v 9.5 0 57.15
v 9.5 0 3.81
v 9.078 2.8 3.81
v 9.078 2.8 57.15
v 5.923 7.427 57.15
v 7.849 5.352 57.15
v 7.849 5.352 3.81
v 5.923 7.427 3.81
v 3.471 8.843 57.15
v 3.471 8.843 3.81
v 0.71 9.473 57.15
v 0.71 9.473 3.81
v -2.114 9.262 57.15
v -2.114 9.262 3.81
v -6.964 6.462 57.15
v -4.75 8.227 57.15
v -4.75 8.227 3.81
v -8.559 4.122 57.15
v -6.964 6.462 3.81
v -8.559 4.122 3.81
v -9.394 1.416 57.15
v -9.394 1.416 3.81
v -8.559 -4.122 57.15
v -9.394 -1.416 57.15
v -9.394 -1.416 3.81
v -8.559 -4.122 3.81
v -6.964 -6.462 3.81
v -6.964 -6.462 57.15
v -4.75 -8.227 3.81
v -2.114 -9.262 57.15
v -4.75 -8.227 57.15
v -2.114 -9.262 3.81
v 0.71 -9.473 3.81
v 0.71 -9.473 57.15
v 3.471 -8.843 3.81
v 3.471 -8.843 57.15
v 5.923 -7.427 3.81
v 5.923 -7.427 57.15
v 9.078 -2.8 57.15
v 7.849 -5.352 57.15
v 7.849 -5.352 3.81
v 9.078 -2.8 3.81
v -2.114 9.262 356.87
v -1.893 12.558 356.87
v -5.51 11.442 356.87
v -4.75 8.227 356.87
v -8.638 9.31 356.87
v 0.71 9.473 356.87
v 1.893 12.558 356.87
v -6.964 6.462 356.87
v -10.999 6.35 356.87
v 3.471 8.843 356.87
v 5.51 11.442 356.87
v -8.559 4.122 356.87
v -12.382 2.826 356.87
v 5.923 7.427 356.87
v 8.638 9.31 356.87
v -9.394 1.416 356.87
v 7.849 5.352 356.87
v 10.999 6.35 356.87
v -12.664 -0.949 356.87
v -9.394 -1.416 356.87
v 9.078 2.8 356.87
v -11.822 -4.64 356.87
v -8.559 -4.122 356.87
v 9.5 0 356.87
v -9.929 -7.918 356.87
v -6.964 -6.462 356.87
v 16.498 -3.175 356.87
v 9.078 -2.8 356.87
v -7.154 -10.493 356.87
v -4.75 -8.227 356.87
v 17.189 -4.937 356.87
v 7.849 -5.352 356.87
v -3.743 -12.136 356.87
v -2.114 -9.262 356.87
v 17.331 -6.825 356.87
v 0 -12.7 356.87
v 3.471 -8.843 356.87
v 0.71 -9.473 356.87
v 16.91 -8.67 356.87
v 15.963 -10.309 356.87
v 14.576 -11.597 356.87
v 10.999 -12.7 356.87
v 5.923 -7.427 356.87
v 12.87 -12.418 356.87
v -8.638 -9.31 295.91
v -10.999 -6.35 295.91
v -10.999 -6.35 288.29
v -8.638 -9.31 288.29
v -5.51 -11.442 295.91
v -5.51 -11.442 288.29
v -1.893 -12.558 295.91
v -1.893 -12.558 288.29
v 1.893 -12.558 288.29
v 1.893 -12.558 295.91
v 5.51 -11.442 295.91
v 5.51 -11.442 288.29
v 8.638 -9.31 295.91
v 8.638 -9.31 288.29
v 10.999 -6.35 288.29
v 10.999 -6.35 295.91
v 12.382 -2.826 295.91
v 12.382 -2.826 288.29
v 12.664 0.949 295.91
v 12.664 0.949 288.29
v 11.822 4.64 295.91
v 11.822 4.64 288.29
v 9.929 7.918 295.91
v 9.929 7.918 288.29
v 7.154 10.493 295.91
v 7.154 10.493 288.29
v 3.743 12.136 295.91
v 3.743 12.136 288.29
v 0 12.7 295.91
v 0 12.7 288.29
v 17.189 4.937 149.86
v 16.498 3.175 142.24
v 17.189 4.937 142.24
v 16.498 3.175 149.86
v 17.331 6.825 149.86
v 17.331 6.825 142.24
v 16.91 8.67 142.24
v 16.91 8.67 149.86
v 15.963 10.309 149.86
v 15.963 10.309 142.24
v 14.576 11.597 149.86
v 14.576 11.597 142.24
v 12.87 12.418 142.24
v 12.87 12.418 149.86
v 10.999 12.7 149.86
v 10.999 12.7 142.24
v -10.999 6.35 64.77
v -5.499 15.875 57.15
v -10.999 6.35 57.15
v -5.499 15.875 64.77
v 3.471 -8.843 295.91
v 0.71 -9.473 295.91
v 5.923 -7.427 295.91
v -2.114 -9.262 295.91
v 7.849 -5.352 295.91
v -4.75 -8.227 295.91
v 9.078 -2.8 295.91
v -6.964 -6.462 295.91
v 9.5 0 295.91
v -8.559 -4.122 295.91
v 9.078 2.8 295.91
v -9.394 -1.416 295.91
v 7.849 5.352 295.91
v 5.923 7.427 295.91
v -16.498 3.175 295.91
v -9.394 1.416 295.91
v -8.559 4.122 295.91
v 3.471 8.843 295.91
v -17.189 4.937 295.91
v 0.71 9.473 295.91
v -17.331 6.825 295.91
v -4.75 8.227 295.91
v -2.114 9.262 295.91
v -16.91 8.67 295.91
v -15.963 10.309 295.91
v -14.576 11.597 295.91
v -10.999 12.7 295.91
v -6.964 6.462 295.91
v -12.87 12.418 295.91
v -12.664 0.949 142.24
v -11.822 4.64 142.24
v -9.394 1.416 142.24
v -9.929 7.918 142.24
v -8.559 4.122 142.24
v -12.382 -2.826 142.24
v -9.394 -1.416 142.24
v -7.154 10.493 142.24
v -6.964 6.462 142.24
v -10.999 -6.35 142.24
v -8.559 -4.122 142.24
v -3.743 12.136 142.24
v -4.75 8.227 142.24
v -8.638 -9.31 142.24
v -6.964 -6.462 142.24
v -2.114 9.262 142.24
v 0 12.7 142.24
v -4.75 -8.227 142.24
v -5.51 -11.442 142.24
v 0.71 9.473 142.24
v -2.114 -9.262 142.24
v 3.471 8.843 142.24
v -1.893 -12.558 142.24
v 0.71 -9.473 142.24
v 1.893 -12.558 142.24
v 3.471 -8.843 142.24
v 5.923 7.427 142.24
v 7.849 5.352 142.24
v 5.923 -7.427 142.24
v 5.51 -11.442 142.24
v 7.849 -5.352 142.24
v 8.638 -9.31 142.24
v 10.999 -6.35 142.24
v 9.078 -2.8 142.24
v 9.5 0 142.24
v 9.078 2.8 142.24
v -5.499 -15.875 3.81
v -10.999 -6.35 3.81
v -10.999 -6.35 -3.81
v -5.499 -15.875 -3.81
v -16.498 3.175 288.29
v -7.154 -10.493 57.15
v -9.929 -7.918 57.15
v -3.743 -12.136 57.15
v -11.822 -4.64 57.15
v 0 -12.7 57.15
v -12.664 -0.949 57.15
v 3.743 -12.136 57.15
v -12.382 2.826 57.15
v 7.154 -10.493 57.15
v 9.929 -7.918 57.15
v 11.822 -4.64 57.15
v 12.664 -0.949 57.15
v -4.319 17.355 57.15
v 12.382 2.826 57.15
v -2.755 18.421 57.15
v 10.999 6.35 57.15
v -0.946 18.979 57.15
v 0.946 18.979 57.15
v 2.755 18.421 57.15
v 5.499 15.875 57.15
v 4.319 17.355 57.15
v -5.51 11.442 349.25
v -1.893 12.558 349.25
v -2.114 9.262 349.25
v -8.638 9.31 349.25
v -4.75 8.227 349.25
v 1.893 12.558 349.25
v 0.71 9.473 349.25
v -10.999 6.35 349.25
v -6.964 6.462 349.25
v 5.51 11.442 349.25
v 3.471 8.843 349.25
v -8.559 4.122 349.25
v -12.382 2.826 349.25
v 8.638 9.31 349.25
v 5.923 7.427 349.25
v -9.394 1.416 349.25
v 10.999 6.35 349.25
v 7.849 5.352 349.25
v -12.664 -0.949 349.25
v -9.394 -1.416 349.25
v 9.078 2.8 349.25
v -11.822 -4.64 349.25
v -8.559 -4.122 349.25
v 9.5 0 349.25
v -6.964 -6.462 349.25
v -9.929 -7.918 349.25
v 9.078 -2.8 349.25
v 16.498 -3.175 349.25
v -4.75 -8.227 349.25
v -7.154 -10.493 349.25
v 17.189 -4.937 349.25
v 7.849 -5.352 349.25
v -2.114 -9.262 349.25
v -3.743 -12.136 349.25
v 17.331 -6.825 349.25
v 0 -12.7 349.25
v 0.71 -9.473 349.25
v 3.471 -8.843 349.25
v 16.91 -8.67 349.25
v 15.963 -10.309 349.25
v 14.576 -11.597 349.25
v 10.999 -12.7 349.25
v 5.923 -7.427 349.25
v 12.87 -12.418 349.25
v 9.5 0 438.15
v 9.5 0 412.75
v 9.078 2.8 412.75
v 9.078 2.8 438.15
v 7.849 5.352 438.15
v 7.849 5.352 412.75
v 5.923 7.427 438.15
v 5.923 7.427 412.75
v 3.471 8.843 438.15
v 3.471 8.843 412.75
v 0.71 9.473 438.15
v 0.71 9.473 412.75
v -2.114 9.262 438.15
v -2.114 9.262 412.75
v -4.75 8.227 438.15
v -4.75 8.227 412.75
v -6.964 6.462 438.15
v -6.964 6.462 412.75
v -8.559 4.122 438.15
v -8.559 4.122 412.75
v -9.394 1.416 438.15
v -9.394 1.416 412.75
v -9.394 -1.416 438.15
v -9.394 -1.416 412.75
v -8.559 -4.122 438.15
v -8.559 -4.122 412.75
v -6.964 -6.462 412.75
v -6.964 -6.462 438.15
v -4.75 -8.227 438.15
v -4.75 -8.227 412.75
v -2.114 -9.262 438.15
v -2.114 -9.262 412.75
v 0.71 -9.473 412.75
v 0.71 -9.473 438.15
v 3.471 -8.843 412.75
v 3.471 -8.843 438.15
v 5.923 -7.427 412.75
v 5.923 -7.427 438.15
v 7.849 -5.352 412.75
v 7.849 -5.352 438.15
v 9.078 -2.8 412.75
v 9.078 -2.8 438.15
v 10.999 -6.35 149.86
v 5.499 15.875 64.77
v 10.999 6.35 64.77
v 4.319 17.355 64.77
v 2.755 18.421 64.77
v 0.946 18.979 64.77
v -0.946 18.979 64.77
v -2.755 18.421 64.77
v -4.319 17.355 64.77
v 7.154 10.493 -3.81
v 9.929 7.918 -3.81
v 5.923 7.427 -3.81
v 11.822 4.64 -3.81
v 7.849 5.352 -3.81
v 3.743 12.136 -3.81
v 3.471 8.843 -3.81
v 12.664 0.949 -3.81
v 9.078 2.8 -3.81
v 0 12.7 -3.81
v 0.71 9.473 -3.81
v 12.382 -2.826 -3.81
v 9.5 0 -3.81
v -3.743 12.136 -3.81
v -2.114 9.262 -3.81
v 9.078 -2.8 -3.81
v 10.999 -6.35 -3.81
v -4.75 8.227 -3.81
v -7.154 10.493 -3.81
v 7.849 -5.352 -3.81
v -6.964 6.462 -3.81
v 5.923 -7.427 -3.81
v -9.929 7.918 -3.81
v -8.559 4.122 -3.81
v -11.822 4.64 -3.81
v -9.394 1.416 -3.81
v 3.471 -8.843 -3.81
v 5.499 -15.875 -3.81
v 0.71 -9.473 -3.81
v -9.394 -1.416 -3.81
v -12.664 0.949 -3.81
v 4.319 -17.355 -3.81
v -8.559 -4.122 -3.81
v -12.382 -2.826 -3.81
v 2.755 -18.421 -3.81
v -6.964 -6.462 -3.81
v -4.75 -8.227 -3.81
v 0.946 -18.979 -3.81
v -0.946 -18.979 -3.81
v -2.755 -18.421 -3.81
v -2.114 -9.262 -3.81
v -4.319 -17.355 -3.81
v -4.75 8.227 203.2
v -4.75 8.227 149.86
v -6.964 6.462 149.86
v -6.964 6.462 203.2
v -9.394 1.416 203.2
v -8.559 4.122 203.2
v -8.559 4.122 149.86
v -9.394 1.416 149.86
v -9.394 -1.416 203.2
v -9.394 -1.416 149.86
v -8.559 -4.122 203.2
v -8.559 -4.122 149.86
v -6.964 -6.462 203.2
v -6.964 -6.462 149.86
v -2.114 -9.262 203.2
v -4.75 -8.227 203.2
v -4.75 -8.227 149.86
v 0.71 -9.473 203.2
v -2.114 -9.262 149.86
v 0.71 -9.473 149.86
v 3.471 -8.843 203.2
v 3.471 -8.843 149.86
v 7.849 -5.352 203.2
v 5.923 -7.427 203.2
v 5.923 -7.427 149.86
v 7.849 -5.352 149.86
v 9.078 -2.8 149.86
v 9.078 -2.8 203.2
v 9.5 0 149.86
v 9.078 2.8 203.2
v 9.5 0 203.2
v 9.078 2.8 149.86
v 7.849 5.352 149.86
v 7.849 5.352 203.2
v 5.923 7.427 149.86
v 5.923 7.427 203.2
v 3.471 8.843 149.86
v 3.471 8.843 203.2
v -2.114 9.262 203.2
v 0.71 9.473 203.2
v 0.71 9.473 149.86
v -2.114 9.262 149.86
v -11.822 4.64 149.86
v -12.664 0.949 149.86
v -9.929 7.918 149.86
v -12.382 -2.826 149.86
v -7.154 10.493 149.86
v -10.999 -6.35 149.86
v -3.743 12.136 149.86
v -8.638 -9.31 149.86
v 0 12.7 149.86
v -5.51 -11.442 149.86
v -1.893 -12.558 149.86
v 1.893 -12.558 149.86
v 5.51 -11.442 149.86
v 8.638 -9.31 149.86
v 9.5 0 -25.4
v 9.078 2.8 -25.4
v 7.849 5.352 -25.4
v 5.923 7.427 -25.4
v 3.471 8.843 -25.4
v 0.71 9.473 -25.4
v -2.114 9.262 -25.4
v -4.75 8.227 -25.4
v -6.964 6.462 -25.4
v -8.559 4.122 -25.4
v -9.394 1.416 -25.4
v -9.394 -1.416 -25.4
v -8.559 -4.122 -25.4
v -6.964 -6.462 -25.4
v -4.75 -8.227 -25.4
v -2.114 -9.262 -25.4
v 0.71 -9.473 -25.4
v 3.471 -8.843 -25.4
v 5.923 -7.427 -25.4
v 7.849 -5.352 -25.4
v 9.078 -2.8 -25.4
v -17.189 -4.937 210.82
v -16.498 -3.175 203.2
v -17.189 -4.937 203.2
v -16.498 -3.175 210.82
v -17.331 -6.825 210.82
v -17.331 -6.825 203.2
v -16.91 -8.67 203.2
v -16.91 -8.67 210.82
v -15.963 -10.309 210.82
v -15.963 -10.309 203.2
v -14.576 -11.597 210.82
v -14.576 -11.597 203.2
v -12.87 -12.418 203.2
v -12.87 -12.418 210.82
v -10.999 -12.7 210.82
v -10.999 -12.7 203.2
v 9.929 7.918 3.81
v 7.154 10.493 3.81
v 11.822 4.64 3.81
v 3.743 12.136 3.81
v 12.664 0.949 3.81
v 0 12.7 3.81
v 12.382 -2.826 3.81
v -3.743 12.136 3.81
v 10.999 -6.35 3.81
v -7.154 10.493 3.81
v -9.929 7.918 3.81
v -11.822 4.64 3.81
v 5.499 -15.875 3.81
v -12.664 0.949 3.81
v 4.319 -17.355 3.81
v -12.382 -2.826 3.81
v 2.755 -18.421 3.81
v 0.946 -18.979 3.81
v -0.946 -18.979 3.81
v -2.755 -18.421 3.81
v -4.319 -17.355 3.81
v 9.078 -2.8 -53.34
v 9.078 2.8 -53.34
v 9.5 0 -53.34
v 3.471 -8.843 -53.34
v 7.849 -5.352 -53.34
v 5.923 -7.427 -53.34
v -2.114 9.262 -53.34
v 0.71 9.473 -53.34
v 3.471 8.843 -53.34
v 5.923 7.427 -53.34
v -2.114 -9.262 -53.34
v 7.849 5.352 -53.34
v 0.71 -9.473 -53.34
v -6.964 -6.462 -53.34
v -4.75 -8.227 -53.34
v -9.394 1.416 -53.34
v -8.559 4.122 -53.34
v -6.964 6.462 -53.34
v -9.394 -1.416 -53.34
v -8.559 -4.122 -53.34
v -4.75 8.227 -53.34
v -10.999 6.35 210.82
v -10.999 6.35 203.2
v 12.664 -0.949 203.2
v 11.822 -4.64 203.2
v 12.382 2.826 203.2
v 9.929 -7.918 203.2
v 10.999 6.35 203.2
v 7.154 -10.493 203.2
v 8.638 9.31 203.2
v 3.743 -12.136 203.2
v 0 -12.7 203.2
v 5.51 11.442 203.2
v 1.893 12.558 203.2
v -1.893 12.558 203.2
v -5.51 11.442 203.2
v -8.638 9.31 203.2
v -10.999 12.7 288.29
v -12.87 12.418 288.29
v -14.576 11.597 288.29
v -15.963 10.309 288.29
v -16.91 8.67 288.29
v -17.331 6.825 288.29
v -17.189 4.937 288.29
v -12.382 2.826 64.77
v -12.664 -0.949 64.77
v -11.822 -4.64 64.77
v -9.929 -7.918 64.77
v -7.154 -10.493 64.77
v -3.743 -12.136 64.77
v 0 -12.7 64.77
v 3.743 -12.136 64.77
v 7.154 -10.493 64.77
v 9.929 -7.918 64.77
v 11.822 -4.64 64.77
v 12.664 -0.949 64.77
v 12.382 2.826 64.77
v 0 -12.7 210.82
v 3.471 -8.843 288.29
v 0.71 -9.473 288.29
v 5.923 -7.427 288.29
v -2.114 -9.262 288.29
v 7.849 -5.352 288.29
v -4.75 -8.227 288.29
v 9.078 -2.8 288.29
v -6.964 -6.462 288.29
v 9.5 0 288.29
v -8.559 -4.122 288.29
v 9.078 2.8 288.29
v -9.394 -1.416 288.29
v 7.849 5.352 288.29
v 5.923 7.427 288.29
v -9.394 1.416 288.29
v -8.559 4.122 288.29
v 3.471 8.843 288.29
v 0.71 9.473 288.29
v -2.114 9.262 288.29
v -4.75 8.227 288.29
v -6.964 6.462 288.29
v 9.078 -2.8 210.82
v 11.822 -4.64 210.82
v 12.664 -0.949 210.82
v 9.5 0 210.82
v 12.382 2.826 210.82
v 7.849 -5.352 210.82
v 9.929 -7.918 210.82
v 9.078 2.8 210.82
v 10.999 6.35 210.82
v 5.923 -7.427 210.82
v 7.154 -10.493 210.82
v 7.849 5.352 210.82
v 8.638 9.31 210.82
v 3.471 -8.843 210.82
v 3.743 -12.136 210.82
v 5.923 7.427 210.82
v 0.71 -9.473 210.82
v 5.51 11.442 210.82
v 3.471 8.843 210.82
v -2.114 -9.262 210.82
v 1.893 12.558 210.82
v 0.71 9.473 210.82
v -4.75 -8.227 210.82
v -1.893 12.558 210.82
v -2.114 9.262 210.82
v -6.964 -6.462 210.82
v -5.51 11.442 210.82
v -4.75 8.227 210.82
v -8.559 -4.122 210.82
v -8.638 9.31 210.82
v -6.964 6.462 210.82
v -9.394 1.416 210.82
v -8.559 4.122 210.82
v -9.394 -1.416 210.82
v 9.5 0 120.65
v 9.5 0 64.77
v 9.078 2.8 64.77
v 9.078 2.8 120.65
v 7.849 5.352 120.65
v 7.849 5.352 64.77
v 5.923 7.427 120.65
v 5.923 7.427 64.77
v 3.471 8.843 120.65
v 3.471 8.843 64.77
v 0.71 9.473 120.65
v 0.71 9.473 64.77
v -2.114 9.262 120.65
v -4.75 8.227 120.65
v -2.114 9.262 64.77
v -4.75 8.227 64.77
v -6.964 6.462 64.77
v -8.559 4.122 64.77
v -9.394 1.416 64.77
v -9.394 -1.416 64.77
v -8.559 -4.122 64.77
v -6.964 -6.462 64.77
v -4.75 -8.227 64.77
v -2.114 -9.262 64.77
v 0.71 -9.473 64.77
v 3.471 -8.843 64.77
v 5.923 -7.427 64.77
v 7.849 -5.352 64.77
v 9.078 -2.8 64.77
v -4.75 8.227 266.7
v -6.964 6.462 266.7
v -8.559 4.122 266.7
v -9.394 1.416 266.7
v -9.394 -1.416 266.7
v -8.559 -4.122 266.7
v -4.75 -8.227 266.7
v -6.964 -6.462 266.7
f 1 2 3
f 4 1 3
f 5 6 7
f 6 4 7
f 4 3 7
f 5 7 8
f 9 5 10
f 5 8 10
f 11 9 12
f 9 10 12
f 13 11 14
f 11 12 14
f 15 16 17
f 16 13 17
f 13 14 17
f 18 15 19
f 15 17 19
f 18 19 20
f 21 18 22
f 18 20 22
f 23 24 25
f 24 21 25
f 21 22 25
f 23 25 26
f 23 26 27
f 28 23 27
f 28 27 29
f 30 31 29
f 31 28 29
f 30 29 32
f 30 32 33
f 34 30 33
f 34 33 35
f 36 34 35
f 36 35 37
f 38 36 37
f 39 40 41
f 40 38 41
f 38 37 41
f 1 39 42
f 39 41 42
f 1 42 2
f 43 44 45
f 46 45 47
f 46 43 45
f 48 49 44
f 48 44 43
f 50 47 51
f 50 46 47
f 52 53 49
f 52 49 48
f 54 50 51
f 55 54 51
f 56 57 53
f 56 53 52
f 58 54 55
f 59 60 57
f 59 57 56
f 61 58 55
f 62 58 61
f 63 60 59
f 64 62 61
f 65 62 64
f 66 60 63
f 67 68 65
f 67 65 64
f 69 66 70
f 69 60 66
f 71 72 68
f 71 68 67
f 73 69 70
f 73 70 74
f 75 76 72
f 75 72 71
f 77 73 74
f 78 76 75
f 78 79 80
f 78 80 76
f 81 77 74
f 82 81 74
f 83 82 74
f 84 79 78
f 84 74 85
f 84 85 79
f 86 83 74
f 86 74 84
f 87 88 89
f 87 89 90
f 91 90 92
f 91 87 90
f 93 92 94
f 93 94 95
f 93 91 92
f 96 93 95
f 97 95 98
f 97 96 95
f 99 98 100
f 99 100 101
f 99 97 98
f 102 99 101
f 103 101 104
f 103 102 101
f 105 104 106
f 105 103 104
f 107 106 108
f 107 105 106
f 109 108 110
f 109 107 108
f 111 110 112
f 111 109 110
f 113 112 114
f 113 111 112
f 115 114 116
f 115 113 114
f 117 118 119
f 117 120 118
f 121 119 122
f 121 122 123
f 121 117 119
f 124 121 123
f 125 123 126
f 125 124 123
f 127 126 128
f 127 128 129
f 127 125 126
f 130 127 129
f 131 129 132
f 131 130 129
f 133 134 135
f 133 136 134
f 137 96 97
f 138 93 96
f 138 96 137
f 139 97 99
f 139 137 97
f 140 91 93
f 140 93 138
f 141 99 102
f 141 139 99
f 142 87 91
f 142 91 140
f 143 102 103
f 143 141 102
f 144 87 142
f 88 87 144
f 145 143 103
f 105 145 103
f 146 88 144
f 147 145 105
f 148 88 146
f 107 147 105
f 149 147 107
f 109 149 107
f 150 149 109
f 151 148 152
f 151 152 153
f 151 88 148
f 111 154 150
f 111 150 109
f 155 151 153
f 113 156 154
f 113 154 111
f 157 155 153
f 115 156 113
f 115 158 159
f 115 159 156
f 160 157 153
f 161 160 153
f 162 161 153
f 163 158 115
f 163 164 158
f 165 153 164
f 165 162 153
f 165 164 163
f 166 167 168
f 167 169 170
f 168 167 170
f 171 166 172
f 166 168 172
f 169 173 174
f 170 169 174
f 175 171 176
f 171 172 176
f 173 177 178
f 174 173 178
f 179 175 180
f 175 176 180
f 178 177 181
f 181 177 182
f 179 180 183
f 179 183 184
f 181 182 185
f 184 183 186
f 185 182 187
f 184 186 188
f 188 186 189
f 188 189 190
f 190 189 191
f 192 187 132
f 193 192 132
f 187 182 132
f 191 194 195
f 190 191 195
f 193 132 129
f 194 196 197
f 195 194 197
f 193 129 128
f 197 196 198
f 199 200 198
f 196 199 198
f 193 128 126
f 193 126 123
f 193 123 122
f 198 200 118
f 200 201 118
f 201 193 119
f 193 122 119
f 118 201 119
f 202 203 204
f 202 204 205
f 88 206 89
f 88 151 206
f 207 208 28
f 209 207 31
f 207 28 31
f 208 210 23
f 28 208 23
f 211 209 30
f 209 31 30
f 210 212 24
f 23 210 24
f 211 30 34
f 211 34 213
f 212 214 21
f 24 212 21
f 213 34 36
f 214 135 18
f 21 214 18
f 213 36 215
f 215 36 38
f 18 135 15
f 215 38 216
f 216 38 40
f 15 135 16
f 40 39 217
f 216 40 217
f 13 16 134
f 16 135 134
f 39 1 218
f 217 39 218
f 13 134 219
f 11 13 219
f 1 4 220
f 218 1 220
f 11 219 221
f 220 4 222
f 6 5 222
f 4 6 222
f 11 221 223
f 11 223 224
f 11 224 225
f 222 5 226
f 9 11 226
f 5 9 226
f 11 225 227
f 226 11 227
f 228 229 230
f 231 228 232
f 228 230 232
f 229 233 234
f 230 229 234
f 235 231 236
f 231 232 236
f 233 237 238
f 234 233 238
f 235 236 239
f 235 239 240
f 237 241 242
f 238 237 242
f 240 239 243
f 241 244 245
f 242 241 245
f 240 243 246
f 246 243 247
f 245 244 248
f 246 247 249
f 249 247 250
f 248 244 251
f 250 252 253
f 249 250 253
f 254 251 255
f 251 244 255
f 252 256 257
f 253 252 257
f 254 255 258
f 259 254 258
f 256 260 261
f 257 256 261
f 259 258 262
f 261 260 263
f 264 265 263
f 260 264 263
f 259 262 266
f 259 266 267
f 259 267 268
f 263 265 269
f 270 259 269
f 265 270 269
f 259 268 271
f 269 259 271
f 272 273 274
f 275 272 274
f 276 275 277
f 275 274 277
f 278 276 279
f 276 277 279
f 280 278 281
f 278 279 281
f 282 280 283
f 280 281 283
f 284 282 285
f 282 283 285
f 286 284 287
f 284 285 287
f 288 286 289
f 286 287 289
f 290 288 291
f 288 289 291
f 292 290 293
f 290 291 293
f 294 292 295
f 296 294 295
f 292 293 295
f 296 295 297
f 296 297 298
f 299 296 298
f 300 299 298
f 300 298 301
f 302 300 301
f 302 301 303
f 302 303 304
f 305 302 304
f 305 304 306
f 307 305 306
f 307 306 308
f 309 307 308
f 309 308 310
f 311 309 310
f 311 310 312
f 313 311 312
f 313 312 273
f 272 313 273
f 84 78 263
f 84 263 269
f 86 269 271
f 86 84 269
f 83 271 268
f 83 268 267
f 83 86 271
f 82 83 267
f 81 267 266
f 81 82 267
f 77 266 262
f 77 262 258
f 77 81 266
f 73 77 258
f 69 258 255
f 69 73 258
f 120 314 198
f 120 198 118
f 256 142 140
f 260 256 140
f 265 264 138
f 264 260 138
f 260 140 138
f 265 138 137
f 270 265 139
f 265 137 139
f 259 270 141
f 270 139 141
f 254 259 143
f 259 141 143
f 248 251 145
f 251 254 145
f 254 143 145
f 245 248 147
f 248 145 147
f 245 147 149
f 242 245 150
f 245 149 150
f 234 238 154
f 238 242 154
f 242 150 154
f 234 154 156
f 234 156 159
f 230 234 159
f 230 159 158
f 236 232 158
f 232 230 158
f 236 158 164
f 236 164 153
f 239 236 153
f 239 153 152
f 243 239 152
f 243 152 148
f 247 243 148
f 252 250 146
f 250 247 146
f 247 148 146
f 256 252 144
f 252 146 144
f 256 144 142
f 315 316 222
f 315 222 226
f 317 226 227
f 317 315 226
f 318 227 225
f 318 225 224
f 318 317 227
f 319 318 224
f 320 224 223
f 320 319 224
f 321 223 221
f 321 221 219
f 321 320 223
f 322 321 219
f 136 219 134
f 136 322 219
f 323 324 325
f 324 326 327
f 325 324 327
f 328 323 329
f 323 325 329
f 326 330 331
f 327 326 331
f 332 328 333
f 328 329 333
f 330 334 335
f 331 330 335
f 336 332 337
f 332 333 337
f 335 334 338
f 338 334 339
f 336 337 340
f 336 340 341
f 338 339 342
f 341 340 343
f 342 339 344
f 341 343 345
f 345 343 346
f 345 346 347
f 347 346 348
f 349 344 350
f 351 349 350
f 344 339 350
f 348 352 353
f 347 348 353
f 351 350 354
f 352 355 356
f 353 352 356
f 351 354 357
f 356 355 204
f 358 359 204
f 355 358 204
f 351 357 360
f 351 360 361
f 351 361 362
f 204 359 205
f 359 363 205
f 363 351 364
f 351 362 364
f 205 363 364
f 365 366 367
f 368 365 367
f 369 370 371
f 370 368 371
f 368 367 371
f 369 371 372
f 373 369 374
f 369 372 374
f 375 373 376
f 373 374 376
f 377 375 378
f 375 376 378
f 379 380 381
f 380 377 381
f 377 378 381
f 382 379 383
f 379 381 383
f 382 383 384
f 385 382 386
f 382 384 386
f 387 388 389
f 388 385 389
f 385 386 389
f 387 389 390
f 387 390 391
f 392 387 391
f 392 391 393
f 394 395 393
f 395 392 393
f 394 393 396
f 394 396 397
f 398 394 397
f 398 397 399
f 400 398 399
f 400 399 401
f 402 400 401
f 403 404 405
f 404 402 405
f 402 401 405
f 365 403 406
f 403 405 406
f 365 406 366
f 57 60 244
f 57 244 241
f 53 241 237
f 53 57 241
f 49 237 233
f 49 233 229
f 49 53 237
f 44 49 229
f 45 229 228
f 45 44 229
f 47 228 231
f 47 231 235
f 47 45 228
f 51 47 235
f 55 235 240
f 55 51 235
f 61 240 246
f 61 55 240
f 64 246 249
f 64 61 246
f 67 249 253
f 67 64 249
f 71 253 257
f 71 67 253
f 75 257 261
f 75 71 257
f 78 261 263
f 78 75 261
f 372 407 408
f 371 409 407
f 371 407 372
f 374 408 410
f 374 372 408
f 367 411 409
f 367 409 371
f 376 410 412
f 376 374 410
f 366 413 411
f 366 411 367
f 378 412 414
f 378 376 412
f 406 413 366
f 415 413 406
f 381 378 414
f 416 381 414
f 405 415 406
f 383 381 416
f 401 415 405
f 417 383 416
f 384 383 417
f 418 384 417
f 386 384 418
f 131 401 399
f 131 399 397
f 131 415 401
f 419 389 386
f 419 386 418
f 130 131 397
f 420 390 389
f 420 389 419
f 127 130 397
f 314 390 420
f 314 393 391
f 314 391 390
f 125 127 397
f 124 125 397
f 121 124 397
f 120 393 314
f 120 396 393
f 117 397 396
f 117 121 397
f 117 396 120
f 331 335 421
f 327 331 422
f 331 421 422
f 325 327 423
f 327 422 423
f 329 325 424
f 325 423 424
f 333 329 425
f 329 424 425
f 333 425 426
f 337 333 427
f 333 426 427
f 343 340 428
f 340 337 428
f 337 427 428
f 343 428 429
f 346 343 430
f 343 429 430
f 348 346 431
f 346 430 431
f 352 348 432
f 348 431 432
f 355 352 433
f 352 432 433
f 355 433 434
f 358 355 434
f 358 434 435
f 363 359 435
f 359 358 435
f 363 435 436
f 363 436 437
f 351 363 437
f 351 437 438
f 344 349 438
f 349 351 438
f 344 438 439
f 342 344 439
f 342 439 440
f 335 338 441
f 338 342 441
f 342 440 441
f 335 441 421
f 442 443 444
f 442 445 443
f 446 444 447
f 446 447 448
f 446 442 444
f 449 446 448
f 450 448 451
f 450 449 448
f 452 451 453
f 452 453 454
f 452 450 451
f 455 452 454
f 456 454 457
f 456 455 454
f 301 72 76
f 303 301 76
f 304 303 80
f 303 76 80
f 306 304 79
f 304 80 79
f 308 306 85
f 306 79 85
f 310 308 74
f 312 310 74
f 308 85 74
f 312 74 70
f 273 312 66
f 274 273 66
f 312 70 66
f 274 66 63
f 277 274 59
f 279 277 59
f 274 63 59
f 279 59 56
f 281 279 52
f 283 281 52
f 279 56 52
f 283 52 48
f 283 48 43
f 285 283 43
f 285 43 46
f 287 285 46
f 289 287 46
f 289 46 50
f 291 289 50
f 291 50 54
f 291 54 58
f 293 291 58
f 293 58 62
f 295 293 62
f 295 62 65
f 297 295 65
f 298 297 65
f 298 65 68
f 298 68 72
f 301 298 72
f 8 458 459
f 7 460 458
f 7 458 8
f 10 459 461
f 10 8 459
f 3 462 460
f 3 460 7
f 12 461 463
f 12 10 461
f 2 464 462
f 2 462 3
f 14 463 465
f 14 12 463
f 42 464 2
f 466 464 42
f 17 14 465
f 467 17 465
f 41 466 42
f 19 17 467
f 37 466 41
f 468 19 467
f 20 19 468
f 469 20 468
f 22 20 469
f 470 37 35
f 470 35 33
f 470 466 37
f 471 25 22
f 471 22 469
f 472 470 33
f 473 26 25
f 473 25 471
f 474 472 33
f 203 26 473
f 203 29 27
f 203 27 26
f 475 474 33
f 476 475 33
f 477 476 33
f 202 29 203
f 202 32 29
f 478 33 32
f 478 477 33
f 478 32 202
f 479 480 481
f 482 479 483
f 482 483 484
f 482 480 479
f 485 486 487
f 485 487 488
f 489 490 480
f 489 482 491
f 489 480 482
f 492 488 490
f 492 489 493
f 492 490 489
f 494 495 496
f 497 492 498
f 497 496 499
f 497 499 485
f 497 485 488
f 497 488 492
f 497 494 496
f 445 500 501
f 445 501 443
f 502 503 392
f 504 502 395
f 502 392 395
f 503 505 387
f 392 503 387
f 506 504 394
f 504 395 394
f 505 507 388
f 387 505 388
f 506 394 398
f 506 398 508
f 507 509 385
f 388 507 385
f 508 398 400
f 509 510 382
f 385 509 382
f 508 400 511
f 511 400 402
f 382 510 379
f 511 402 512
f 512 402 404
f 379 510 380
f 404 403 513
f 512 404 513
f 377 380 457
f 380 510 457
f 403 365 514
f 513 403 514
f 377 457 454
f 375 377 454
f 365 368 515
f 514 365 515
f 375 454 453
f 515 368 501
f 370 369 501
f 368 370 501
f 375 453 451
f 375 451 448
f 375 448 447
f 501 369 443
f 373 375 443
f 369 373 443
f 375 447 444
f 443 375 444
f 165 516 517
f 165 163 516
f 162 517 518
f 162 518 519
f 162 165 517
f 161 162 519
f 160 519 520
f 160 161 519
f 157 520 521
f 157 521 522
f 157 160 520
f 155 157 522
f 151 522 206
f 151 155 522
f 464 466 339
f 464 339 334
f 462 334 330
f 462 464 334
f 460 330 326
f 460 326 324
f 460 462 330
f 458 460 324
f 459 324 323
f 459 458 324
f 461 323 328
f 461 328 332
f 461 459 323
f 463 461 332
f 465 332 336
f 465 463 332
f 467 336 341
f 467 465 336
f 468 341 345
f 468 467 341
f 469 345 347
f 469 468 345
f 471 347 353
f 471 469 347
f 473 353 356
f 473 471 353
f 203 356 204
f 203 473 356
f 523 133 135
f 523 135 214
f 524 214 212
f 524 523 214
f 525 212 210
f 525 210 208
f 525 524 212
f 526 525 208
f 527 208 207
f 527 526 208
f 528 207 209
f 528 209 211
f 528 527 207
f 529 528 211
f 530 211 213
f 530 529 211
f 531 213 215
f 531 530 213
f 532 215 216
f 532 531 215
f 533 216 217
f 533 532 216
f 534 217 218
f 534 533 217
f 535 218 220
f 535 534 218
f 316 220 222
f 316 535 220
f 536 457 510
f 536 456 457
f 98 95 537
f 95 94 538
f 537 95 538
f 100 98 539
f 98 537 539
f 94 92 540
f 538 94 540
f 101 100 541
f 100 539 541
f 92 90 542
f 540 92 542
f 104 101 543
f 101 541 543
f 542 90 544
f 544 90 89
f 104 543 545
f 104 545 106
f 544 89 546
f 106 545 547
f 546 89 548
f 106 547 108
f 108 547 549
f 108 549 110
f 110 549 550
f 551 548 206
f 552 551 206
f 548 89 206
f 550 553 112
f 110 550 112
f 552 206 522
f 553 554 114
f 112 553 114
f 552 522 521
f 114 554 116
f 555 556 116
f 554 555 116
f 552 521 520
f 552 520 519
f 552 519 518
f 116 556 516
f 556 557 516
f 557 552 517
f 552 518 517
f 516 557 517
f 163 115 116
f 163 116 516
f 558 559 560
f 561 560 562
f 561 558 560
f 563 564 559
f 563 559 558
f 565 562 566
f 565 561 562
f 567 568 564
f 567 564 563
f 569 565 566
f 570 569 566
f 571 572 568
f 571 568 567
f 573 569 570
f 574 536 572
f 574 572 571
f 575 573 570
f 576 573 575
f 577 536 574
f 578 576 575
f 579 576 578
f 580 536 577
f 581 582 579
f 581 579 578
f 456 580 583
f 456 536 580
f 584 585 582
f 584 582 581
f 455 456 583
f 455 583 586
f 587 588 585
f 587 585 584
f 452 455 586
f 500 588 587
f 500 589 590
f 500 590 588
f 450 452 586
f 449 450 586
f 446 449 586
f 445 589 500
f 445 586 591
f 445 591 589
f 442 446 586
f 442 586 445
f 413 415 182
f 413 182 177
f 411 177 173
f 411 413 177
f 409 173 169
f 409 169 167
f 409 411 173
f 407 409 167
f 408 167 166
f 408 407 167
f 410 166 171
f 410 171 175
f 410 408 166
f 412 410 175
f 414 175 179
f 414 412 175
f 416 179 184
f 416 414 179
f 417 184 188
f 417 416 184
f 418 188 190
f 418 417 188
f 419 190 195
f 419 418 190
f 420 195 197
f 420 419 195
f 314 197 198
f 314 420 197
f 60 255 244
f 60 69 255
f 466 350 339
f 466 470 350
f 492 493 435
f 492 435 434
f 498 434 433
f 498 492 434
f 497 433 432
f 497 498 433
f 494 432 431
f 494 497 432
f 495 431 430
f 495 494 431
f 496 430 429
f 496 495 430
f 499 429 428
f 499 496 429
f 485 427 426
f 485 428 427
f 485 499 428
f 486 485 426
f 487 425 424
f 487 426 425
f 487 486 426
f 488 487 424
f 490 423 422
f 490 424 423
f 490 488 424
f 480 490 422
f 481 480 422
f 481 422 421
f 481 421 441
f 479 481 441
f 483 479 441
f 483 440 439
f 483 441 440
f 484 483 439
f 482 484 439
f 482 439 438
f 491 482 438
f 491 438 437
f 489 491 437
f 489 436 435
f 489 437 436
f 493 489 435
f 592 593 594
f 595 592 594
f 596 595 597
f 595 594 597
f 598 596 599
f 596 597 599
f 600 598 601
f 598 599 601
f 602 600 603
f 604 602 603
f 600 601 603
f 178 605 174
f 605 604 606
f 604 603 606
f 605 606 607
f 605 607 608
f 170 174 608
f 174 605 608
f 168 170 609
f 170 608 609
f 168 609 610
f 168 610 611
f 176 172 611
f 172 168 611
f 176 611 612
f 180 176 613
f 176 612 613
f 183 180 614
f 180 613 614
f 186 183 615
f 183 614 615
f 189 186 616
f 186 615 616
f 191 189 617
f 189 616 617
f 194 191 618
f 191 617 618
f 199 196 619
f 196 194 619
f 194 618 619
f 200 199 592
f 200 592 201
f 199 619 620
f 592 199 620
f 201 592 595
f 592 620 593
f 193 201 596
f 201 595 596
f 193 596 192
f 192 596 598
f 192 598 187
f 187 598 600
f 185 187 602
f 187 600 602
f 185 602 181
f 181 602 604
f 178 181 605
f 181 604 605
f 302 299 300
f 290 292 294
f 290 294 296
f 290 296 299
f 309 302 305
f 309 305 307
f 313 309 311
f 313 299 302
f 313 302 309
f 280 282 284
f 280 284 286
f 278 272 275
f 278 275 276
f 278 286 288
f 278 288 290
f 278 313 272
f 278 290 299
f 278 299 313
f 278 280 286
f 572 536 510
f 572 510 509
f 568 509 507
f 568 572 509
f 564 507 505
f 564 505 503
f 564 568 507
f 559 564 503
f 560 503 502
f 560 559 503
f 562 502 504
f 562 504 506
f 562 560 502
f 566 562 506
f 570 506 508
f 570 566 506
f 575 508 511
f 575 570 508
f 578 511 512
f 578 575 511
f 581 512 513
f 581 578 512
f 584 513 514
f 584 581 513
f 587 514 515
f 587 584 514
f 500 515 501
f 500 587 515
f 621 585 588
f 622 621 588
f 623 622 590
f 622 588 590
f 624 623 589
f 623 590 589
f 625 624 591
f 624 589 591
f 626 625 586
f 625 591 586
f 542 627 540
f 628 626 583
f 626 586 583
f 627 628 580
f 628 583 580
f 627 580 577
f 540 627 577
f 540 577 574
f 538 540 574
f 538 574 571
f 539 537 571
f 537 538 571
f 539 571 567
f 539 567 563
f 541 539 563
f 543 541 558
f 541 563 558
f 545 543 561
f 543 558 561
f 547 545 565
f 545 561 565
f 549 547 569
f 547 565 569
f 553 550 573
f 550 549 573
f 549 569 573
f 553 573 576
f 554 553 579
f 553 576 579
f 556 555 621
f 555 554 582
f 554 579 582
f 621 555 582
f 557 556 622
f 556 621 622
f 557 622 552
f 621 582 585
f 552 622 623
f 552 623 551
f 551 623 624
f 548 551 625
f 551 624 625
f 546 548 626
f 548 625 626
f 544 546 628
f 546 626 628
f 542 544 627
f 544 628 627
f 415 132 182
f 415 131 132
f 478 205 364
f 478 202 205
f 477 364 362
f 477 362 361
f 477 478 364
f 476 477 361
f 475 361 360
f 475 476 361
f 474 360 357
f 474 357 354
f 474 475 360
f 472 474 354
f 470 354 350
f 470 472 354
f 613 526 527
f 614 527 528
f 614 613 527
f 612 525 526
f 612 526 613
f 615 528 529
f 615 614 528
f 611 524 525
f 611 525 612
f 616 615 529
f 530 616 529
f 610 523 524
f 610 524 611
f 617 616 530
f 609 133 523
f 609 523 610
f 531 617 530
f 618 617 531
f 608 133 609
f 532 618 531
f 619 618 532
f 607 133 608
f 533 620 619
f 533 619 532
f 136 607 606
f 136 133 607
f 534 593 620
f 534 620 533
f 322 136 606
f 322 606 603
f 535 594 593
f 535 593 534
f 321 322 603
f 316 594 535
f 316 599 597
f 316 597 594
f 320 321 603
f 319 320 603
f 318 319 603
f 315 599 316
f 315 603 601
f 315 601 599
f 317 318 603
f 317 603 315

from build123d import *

# Parameters (mm, degrees)
BOSS_EXTRUDE1_DEPTH   = 3.81
BODY_MOVE_COPY2_ANGLE = 180
BOSS_EXTRUDE2_START   = -25.4
SKETCH2_R             = 9.5
BOSS_EXTRUDE2_DEPTH   = 146.05
LPATTERN1_COUNT       = 3
LPATTERN1_PITCH       = 146.05
BODY_MOVE_COPY3_ANGLE = 120
BODY_MOVE_COPY4_ANGLE = 120
BOSS_EXTRUDE3_START   = 27.94
SKETCH3_R             = 9.5
BOSS_EXTRUDE3_DEPTH   = 27.94
SKETCH5_R             = 9.5
BOSS_EXTRUDE4_DEPTH   = 25.4


with BuildPart() as part:
    # Sketch1 → Boss-Extrude1 (new, symmetric)
    with BuildSketch(Plane.XY):
        with BuildLine():
            Line((-5.499261314, 15.875), (-10.998522628, 6.35))
            ThreePointArc((-10.998522628, 6.35), (0, -12.7), (10.998522628, 6.35))
            Line((10.998522628, 6.35), (5.499261314, 15.875))
            ThreePointArc((5.499261314, 15.875), (0, 19.05), (-5.499261314, 15.875))
        make_face()
    extrude(amount=BOSS_EXTRUDE1_DEPTH, both=True)


with BuildPart() as body_2:
    # Body-Move/Copy1: copy of part
    add(part.part.moved(Location((0, 0, 60.96))))


with BuildPart() as part_1:
    # Body-Move/Copy2: moved
    add(part.part.rotate(Axis((0, 0, 0), (0, 0, 1)), BODY_MOVE_COPY2_ANGLE))


    add(body_2.part)  # Boss-Extrude2 merges body 2
    # Sketch2 → Boss-Extrude2 (add)
    with BuildSketch(Plane.XY.offset(BOSS_EXTRUDE2_START)):
        Circle(SKETCH2_R)
    extrude(amount=BOSS_EXTRUDE2_DEPTH)


with BuildPart() as lpattern1_1:
    # LPattern1: pattern copy
    add(part_1.part.moved(Location(Vector(0, 0, 1) * (1 * LPATTERN1_PITCH))))


with BuildPart() as lpattern1_2:
    # LPattern1: pattern copy
    add(part_1.part.moved(Location(Vector(0, 0, 1) * (2 * LPATTERN1_PITCH))))


with BuildPart() as lpattern1_1_1:
    # Body-Move/Copy3: moved
    add(lpattern1_1.part.rotate(Axis((0, 0, 0), (0, 0, 1)), BODY_MOVE_COPY3_ANGLE))


with BuildPart() as lpattern1_2_1:
    # Body-Move/Copy4: moved
    add(lpattern1_2.part.rotate(Axis((0, 0, 0), (0, 0, -1)), BODY_MOVE_COPY4_ANGLE))


with BuildPart() as part_2:
    add(part_1.part)

    # Sketch3 → Boss-Extrude3 (add)
    with BuildSketch(Plane(origin=(0, 0, -25.4), x_dir=(-1, 0, 0), z_dir=(0, 0, -1)).offset(BOSS_EXTRUDE3_START)):
        Circle(SKETCH3_R)
    extrude(amount=-BOSS_EXTRUDE3_DEPTH)

    # Combine1: union LPattern1_1, LPattern1_2
    add(lpattern1_1_1.part)
    add(lpattern1_2_1.part)

    # Sketch5 → Boss-Extrude4 (add)
    with BuildSketch(Plane.XY.offset(412.75)):
        Circle(SKETCH5_R)
    extrude(amount=BOSS_EXTRUDE4_DEPTH)


solid = part_2.part
